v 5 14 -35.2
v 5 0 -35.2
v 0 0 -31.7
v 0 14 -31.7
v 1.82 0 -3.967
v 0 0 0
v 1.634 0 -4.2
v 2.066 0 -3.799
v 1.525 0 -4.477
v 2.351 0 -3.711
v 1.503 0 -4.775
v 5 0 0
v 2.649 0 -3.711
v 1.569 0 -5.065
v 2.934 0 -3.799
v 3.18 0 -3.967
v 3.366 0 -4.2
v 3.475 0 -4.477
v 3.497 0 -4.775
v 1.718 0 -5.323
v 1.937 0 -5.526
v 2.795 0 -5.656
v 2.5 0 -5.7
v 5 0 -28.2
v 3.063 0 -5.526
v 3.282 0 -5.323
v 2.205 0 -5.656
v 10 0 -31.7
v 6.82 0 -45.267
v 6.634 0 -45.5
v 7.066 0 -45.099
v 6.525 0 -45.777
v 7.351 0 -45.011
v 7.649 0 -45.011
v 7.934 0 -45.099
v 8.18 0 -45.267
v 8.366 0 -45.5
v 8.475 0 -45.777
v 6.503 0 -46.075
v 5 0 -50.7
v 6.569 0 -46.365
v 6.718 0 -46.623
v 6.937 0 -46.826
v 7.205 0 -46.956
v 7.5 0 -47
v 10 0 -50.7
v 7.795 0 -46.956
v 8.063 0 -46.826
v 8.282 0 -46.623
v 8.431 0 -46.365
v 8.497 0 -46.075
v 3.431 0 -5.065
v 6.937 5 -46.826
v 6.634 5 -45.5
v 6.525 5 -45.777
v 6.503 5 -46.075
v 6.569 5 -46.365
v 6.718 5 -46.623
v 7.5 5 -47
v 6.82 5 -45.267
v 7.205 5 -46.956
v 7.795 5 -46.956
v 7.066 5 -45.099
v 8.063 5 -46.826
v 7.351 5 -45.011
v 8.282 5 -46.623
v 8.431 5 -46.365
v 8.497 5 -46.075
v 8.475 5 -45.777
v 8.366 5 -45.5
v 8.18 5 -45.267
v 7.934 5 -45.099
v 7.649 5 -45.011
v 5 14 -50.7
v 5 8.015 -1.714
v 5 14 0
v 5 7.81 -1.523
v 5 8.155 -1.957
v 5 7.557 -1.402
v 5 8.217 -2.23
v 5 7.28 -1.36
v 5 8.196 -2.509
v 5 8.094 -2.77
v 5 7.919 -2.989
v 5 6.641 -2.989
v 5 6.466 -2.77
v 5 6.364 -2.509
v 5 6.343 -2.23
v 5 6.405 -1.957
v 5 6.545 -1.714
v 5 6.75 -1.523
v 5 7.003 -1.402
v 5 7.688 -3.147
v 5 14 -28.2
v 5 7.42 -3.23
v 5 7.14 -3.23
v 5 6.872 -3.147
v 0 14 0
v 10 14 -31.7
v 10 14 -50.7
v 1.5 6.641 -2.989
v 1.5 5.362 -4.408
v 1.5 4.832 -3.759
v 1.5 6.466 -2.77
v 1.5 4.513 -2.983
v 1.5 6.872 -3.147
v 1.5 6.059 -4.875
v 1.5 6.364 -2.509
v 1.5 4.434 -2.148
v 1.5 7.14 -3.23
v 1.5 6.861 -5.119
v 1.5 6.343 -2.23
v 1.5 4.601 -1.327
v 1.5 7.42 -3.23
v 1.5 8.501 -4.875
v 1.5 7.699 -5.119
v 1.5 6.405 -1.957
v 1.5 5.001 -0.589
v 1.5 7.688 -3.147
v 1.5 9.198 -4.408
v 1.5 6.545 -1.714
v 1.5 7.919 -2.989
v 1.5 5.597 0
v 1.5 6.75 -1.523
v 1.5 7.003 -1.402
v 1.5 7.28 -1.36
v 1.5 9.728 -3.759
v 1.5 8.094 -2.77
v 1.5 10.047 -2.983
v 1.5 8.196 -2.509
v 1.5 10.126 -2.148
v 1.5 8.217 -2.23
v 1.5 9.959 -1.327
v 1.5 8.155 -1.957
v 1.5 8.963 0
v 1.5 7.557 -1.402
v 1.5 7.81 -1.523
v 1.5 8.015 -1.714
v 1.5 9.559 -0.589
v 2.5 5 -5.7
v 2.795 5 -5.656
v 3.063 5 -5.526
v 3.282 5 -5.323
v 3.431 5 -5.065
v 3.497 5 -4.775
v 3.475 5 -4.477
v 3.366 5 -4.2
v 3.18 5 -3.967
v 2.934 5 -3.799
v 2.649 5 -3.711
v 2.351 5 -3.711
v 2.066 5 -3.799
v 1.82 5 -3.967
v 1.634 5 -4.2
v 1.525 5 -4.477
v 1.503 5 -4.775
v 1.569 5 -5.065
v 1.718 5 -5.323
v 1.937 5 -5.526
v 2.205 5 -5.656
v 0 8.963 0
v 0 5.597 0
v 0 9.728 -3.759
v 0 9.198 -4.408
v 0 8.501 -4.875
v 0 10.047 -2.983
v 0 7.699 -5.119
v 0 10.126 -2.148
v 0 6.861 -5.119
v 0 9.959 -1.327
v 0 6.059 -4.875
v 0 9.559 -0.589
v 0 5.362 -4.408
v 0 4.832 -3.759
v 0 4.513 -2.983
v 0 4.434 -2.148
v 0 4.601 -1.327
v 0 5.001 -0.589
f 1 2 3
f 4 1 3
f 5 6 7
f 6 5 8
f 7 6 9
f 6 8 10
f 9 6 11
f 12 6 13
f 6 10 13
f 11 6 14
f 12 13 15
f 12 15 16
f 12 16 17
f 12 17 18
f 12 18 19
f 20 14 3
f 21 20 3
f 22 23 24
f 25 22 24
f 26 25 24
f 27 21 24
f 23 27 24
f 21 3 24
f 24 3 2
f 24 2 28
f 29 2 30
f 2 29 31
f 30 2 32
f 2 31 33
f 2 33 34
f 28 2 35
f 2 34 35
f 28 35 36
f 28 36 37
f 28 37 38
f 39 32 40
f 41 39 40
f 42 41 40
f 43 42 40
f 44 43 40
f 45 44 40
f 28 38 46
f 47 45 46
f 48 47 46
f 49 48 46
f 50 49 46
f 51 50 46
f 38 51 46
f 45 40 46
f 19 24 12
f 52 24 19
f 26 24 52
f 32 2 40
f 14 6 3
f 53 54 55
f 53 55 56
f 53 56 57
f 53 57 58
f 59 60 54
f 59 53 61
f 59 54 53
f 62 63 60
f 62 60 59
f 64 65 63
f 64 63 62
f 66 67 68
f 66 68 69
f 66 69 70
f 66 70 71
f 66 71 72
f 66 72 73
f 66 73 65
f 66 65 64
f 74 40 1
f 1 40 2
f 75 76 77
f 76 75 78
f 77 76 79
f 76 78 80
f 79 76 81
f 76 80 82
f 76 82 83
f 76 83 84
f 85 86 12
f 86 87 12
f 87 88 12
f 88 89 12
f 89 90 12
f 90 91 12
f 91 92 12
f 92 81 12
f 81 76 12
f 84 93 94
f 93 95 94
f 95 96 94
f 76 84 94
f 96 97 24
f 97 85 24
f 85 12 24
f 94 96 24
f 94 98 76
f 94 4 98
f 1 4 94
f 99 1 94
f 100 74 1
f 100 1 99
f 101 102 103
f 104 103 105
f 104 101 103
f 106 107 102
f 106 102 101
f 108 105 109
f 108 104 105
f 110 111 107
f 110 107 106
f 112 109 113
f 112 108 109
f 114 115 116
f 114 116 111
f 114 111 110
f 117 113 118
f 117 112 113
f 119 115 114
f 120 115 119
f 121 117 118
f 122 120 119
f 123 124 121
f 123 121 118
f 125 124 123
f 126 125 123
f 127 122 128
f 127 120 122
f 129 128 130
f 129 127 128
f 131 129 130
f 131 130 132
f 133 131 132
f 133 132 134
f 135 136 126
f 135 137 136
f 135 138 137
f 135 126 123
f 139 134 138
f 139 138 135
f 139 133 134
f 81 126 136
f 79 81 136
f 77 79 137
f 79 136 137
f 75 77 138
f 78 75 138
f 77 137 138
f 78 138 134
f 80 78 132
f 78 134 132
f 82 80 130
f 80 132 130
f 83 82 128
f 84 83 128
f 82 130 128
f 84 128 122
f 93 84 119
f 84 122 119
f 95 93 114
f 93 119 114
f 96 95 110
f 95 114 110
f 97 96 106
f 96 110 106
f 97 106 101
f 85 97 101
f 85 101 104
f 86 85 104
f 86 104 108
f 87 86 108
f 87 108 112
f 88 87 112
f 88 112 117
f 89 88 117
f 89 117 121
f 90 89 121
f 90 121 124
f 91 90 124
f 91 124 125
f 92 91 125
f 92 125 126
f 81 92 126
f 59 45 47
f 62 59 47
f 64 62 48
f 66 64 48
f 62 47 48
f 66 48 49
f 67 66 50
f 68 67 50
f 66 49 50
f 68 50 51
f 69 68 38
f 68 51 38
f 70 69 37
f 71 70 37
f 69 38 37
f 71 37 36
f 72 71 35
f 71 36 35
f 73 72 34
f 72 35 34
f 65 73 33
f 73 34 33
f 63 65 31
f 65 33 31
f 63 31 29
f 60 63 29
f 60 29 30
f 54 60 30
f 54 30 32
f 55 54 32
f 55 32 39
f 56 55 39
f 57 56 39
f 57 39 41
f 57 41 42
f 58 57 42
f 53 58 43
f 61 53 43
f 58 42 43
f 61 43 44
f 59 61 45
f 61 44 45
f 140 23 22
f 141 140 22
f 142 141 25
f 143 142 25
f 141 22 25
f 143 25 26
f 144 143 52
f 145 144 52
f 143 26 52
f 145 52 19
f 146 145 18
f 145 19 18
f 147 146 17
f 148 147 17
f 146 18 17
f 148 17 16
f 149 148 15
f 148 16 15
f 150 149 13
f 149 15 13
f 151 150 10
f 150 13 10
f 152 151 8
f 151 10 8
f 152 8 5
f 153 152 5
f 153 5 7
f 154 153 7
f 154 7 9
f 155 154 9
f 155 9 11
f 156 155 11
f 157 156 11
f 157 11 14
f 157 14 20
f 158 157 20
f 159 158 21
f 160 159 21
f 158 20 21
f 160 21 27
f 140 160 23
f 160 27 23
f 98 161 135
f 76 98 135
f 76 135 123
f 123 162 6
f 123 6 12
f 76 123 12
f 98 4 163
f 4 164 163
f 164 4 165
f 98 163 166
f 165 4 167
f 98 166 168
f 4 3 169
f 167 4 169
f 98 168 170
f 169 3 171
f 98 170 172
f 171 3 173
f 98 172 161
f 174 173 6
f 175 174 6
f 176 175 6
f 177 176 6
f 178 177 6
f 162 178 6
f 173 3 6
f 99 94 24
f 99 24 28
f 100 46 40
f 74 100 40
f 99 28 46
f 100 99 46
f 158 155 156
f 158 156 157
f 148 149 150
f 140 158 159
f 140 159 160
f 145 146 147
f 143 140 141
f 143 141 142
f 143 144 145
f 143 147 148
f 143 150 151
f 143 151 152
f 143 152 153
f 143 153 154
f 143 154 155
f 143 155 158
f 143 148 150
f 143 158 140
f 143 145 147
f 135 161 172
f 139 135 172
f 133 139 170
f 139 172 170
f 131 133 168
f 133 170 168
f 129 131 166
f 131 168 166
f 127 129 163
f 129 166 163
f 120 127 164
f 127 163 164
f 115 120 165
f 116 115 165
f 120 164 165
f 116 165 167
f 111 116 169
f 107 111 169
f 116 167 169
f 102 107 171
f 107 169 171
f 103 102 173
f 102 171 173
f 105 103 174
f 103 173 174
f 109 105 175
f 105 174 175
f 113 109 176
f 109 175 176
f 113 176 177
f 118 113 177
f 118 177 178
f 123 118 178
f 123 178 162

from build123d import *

# Parameters (mm, degrees)
SALIENTE_EXTRUIR1_DEPTH = 14
CROQUIS3_R              = 1
CORTAR_EXTRUIR1_DEPTH   = 5
CROQUIS5_R              = 2.85
CORTAR_EXTRUIR2_DEPTH   = 1.5
CROQUIS6_R              = 0.94
CORTAR_EXTRUIR3_DEPTH   = 54.279827327


with BuildPart() as part:
    # Croquis1 → Saliente-Extruir1 (new body)
    with BuildSketch(Plane(origin=(0, 0, 0), x_dir=(1, 0, 0), z_dir=(0, 1, 0))):
        Polygon((0, 0), (5, 0), (5, 28.2), (10, 31.7), (10, 50.7), (5, 50.7), (5, 35.2), (0, 31.7), align=None)
    extrude(amount=SALIENTE_EXTRUIR1_DEPTH)

    # Croquis3 → Cortar-Extruir1 (cut)
    with BuildSketch(Plane.XZ):
        with Locations(Location((2.5, -4.7, 0), (0, 0, 270))):
            Circle(CROQUIS3_R)
        with Locations(Location((7.5, -46, 0), (0, 0, 270))):
            Circle(CROQUIS3_R)
    extrude(amount=-CORTAR_EXTRUIR1_DEPTH, mode=Mode.SUBTRACT)

    # Croquis5 → Cortar-Extruir2 (cut)
    with BuildSketch(Plane.ZY):
        with Locations((-2.3, 7.28)):
            Circle(CROQUIS5_R)
    extrude(amount=-CORTAR_EXTRUIR2_DEPTH, mode=Mode.SUBTRACT)

    # Croquis6 → Cortar-Extruir3 (cut, through all)
    with BuildSketch(Plane.ZY.offset(-1.5)):
        with Locations((-2.3, 7.28)):
            Circle(CROQUIS6_R)
    extrude(amount=-CORTAR_EXTRUIR3_DEPTH, mode=Mode.SUBTRACT)


solid = part.part
